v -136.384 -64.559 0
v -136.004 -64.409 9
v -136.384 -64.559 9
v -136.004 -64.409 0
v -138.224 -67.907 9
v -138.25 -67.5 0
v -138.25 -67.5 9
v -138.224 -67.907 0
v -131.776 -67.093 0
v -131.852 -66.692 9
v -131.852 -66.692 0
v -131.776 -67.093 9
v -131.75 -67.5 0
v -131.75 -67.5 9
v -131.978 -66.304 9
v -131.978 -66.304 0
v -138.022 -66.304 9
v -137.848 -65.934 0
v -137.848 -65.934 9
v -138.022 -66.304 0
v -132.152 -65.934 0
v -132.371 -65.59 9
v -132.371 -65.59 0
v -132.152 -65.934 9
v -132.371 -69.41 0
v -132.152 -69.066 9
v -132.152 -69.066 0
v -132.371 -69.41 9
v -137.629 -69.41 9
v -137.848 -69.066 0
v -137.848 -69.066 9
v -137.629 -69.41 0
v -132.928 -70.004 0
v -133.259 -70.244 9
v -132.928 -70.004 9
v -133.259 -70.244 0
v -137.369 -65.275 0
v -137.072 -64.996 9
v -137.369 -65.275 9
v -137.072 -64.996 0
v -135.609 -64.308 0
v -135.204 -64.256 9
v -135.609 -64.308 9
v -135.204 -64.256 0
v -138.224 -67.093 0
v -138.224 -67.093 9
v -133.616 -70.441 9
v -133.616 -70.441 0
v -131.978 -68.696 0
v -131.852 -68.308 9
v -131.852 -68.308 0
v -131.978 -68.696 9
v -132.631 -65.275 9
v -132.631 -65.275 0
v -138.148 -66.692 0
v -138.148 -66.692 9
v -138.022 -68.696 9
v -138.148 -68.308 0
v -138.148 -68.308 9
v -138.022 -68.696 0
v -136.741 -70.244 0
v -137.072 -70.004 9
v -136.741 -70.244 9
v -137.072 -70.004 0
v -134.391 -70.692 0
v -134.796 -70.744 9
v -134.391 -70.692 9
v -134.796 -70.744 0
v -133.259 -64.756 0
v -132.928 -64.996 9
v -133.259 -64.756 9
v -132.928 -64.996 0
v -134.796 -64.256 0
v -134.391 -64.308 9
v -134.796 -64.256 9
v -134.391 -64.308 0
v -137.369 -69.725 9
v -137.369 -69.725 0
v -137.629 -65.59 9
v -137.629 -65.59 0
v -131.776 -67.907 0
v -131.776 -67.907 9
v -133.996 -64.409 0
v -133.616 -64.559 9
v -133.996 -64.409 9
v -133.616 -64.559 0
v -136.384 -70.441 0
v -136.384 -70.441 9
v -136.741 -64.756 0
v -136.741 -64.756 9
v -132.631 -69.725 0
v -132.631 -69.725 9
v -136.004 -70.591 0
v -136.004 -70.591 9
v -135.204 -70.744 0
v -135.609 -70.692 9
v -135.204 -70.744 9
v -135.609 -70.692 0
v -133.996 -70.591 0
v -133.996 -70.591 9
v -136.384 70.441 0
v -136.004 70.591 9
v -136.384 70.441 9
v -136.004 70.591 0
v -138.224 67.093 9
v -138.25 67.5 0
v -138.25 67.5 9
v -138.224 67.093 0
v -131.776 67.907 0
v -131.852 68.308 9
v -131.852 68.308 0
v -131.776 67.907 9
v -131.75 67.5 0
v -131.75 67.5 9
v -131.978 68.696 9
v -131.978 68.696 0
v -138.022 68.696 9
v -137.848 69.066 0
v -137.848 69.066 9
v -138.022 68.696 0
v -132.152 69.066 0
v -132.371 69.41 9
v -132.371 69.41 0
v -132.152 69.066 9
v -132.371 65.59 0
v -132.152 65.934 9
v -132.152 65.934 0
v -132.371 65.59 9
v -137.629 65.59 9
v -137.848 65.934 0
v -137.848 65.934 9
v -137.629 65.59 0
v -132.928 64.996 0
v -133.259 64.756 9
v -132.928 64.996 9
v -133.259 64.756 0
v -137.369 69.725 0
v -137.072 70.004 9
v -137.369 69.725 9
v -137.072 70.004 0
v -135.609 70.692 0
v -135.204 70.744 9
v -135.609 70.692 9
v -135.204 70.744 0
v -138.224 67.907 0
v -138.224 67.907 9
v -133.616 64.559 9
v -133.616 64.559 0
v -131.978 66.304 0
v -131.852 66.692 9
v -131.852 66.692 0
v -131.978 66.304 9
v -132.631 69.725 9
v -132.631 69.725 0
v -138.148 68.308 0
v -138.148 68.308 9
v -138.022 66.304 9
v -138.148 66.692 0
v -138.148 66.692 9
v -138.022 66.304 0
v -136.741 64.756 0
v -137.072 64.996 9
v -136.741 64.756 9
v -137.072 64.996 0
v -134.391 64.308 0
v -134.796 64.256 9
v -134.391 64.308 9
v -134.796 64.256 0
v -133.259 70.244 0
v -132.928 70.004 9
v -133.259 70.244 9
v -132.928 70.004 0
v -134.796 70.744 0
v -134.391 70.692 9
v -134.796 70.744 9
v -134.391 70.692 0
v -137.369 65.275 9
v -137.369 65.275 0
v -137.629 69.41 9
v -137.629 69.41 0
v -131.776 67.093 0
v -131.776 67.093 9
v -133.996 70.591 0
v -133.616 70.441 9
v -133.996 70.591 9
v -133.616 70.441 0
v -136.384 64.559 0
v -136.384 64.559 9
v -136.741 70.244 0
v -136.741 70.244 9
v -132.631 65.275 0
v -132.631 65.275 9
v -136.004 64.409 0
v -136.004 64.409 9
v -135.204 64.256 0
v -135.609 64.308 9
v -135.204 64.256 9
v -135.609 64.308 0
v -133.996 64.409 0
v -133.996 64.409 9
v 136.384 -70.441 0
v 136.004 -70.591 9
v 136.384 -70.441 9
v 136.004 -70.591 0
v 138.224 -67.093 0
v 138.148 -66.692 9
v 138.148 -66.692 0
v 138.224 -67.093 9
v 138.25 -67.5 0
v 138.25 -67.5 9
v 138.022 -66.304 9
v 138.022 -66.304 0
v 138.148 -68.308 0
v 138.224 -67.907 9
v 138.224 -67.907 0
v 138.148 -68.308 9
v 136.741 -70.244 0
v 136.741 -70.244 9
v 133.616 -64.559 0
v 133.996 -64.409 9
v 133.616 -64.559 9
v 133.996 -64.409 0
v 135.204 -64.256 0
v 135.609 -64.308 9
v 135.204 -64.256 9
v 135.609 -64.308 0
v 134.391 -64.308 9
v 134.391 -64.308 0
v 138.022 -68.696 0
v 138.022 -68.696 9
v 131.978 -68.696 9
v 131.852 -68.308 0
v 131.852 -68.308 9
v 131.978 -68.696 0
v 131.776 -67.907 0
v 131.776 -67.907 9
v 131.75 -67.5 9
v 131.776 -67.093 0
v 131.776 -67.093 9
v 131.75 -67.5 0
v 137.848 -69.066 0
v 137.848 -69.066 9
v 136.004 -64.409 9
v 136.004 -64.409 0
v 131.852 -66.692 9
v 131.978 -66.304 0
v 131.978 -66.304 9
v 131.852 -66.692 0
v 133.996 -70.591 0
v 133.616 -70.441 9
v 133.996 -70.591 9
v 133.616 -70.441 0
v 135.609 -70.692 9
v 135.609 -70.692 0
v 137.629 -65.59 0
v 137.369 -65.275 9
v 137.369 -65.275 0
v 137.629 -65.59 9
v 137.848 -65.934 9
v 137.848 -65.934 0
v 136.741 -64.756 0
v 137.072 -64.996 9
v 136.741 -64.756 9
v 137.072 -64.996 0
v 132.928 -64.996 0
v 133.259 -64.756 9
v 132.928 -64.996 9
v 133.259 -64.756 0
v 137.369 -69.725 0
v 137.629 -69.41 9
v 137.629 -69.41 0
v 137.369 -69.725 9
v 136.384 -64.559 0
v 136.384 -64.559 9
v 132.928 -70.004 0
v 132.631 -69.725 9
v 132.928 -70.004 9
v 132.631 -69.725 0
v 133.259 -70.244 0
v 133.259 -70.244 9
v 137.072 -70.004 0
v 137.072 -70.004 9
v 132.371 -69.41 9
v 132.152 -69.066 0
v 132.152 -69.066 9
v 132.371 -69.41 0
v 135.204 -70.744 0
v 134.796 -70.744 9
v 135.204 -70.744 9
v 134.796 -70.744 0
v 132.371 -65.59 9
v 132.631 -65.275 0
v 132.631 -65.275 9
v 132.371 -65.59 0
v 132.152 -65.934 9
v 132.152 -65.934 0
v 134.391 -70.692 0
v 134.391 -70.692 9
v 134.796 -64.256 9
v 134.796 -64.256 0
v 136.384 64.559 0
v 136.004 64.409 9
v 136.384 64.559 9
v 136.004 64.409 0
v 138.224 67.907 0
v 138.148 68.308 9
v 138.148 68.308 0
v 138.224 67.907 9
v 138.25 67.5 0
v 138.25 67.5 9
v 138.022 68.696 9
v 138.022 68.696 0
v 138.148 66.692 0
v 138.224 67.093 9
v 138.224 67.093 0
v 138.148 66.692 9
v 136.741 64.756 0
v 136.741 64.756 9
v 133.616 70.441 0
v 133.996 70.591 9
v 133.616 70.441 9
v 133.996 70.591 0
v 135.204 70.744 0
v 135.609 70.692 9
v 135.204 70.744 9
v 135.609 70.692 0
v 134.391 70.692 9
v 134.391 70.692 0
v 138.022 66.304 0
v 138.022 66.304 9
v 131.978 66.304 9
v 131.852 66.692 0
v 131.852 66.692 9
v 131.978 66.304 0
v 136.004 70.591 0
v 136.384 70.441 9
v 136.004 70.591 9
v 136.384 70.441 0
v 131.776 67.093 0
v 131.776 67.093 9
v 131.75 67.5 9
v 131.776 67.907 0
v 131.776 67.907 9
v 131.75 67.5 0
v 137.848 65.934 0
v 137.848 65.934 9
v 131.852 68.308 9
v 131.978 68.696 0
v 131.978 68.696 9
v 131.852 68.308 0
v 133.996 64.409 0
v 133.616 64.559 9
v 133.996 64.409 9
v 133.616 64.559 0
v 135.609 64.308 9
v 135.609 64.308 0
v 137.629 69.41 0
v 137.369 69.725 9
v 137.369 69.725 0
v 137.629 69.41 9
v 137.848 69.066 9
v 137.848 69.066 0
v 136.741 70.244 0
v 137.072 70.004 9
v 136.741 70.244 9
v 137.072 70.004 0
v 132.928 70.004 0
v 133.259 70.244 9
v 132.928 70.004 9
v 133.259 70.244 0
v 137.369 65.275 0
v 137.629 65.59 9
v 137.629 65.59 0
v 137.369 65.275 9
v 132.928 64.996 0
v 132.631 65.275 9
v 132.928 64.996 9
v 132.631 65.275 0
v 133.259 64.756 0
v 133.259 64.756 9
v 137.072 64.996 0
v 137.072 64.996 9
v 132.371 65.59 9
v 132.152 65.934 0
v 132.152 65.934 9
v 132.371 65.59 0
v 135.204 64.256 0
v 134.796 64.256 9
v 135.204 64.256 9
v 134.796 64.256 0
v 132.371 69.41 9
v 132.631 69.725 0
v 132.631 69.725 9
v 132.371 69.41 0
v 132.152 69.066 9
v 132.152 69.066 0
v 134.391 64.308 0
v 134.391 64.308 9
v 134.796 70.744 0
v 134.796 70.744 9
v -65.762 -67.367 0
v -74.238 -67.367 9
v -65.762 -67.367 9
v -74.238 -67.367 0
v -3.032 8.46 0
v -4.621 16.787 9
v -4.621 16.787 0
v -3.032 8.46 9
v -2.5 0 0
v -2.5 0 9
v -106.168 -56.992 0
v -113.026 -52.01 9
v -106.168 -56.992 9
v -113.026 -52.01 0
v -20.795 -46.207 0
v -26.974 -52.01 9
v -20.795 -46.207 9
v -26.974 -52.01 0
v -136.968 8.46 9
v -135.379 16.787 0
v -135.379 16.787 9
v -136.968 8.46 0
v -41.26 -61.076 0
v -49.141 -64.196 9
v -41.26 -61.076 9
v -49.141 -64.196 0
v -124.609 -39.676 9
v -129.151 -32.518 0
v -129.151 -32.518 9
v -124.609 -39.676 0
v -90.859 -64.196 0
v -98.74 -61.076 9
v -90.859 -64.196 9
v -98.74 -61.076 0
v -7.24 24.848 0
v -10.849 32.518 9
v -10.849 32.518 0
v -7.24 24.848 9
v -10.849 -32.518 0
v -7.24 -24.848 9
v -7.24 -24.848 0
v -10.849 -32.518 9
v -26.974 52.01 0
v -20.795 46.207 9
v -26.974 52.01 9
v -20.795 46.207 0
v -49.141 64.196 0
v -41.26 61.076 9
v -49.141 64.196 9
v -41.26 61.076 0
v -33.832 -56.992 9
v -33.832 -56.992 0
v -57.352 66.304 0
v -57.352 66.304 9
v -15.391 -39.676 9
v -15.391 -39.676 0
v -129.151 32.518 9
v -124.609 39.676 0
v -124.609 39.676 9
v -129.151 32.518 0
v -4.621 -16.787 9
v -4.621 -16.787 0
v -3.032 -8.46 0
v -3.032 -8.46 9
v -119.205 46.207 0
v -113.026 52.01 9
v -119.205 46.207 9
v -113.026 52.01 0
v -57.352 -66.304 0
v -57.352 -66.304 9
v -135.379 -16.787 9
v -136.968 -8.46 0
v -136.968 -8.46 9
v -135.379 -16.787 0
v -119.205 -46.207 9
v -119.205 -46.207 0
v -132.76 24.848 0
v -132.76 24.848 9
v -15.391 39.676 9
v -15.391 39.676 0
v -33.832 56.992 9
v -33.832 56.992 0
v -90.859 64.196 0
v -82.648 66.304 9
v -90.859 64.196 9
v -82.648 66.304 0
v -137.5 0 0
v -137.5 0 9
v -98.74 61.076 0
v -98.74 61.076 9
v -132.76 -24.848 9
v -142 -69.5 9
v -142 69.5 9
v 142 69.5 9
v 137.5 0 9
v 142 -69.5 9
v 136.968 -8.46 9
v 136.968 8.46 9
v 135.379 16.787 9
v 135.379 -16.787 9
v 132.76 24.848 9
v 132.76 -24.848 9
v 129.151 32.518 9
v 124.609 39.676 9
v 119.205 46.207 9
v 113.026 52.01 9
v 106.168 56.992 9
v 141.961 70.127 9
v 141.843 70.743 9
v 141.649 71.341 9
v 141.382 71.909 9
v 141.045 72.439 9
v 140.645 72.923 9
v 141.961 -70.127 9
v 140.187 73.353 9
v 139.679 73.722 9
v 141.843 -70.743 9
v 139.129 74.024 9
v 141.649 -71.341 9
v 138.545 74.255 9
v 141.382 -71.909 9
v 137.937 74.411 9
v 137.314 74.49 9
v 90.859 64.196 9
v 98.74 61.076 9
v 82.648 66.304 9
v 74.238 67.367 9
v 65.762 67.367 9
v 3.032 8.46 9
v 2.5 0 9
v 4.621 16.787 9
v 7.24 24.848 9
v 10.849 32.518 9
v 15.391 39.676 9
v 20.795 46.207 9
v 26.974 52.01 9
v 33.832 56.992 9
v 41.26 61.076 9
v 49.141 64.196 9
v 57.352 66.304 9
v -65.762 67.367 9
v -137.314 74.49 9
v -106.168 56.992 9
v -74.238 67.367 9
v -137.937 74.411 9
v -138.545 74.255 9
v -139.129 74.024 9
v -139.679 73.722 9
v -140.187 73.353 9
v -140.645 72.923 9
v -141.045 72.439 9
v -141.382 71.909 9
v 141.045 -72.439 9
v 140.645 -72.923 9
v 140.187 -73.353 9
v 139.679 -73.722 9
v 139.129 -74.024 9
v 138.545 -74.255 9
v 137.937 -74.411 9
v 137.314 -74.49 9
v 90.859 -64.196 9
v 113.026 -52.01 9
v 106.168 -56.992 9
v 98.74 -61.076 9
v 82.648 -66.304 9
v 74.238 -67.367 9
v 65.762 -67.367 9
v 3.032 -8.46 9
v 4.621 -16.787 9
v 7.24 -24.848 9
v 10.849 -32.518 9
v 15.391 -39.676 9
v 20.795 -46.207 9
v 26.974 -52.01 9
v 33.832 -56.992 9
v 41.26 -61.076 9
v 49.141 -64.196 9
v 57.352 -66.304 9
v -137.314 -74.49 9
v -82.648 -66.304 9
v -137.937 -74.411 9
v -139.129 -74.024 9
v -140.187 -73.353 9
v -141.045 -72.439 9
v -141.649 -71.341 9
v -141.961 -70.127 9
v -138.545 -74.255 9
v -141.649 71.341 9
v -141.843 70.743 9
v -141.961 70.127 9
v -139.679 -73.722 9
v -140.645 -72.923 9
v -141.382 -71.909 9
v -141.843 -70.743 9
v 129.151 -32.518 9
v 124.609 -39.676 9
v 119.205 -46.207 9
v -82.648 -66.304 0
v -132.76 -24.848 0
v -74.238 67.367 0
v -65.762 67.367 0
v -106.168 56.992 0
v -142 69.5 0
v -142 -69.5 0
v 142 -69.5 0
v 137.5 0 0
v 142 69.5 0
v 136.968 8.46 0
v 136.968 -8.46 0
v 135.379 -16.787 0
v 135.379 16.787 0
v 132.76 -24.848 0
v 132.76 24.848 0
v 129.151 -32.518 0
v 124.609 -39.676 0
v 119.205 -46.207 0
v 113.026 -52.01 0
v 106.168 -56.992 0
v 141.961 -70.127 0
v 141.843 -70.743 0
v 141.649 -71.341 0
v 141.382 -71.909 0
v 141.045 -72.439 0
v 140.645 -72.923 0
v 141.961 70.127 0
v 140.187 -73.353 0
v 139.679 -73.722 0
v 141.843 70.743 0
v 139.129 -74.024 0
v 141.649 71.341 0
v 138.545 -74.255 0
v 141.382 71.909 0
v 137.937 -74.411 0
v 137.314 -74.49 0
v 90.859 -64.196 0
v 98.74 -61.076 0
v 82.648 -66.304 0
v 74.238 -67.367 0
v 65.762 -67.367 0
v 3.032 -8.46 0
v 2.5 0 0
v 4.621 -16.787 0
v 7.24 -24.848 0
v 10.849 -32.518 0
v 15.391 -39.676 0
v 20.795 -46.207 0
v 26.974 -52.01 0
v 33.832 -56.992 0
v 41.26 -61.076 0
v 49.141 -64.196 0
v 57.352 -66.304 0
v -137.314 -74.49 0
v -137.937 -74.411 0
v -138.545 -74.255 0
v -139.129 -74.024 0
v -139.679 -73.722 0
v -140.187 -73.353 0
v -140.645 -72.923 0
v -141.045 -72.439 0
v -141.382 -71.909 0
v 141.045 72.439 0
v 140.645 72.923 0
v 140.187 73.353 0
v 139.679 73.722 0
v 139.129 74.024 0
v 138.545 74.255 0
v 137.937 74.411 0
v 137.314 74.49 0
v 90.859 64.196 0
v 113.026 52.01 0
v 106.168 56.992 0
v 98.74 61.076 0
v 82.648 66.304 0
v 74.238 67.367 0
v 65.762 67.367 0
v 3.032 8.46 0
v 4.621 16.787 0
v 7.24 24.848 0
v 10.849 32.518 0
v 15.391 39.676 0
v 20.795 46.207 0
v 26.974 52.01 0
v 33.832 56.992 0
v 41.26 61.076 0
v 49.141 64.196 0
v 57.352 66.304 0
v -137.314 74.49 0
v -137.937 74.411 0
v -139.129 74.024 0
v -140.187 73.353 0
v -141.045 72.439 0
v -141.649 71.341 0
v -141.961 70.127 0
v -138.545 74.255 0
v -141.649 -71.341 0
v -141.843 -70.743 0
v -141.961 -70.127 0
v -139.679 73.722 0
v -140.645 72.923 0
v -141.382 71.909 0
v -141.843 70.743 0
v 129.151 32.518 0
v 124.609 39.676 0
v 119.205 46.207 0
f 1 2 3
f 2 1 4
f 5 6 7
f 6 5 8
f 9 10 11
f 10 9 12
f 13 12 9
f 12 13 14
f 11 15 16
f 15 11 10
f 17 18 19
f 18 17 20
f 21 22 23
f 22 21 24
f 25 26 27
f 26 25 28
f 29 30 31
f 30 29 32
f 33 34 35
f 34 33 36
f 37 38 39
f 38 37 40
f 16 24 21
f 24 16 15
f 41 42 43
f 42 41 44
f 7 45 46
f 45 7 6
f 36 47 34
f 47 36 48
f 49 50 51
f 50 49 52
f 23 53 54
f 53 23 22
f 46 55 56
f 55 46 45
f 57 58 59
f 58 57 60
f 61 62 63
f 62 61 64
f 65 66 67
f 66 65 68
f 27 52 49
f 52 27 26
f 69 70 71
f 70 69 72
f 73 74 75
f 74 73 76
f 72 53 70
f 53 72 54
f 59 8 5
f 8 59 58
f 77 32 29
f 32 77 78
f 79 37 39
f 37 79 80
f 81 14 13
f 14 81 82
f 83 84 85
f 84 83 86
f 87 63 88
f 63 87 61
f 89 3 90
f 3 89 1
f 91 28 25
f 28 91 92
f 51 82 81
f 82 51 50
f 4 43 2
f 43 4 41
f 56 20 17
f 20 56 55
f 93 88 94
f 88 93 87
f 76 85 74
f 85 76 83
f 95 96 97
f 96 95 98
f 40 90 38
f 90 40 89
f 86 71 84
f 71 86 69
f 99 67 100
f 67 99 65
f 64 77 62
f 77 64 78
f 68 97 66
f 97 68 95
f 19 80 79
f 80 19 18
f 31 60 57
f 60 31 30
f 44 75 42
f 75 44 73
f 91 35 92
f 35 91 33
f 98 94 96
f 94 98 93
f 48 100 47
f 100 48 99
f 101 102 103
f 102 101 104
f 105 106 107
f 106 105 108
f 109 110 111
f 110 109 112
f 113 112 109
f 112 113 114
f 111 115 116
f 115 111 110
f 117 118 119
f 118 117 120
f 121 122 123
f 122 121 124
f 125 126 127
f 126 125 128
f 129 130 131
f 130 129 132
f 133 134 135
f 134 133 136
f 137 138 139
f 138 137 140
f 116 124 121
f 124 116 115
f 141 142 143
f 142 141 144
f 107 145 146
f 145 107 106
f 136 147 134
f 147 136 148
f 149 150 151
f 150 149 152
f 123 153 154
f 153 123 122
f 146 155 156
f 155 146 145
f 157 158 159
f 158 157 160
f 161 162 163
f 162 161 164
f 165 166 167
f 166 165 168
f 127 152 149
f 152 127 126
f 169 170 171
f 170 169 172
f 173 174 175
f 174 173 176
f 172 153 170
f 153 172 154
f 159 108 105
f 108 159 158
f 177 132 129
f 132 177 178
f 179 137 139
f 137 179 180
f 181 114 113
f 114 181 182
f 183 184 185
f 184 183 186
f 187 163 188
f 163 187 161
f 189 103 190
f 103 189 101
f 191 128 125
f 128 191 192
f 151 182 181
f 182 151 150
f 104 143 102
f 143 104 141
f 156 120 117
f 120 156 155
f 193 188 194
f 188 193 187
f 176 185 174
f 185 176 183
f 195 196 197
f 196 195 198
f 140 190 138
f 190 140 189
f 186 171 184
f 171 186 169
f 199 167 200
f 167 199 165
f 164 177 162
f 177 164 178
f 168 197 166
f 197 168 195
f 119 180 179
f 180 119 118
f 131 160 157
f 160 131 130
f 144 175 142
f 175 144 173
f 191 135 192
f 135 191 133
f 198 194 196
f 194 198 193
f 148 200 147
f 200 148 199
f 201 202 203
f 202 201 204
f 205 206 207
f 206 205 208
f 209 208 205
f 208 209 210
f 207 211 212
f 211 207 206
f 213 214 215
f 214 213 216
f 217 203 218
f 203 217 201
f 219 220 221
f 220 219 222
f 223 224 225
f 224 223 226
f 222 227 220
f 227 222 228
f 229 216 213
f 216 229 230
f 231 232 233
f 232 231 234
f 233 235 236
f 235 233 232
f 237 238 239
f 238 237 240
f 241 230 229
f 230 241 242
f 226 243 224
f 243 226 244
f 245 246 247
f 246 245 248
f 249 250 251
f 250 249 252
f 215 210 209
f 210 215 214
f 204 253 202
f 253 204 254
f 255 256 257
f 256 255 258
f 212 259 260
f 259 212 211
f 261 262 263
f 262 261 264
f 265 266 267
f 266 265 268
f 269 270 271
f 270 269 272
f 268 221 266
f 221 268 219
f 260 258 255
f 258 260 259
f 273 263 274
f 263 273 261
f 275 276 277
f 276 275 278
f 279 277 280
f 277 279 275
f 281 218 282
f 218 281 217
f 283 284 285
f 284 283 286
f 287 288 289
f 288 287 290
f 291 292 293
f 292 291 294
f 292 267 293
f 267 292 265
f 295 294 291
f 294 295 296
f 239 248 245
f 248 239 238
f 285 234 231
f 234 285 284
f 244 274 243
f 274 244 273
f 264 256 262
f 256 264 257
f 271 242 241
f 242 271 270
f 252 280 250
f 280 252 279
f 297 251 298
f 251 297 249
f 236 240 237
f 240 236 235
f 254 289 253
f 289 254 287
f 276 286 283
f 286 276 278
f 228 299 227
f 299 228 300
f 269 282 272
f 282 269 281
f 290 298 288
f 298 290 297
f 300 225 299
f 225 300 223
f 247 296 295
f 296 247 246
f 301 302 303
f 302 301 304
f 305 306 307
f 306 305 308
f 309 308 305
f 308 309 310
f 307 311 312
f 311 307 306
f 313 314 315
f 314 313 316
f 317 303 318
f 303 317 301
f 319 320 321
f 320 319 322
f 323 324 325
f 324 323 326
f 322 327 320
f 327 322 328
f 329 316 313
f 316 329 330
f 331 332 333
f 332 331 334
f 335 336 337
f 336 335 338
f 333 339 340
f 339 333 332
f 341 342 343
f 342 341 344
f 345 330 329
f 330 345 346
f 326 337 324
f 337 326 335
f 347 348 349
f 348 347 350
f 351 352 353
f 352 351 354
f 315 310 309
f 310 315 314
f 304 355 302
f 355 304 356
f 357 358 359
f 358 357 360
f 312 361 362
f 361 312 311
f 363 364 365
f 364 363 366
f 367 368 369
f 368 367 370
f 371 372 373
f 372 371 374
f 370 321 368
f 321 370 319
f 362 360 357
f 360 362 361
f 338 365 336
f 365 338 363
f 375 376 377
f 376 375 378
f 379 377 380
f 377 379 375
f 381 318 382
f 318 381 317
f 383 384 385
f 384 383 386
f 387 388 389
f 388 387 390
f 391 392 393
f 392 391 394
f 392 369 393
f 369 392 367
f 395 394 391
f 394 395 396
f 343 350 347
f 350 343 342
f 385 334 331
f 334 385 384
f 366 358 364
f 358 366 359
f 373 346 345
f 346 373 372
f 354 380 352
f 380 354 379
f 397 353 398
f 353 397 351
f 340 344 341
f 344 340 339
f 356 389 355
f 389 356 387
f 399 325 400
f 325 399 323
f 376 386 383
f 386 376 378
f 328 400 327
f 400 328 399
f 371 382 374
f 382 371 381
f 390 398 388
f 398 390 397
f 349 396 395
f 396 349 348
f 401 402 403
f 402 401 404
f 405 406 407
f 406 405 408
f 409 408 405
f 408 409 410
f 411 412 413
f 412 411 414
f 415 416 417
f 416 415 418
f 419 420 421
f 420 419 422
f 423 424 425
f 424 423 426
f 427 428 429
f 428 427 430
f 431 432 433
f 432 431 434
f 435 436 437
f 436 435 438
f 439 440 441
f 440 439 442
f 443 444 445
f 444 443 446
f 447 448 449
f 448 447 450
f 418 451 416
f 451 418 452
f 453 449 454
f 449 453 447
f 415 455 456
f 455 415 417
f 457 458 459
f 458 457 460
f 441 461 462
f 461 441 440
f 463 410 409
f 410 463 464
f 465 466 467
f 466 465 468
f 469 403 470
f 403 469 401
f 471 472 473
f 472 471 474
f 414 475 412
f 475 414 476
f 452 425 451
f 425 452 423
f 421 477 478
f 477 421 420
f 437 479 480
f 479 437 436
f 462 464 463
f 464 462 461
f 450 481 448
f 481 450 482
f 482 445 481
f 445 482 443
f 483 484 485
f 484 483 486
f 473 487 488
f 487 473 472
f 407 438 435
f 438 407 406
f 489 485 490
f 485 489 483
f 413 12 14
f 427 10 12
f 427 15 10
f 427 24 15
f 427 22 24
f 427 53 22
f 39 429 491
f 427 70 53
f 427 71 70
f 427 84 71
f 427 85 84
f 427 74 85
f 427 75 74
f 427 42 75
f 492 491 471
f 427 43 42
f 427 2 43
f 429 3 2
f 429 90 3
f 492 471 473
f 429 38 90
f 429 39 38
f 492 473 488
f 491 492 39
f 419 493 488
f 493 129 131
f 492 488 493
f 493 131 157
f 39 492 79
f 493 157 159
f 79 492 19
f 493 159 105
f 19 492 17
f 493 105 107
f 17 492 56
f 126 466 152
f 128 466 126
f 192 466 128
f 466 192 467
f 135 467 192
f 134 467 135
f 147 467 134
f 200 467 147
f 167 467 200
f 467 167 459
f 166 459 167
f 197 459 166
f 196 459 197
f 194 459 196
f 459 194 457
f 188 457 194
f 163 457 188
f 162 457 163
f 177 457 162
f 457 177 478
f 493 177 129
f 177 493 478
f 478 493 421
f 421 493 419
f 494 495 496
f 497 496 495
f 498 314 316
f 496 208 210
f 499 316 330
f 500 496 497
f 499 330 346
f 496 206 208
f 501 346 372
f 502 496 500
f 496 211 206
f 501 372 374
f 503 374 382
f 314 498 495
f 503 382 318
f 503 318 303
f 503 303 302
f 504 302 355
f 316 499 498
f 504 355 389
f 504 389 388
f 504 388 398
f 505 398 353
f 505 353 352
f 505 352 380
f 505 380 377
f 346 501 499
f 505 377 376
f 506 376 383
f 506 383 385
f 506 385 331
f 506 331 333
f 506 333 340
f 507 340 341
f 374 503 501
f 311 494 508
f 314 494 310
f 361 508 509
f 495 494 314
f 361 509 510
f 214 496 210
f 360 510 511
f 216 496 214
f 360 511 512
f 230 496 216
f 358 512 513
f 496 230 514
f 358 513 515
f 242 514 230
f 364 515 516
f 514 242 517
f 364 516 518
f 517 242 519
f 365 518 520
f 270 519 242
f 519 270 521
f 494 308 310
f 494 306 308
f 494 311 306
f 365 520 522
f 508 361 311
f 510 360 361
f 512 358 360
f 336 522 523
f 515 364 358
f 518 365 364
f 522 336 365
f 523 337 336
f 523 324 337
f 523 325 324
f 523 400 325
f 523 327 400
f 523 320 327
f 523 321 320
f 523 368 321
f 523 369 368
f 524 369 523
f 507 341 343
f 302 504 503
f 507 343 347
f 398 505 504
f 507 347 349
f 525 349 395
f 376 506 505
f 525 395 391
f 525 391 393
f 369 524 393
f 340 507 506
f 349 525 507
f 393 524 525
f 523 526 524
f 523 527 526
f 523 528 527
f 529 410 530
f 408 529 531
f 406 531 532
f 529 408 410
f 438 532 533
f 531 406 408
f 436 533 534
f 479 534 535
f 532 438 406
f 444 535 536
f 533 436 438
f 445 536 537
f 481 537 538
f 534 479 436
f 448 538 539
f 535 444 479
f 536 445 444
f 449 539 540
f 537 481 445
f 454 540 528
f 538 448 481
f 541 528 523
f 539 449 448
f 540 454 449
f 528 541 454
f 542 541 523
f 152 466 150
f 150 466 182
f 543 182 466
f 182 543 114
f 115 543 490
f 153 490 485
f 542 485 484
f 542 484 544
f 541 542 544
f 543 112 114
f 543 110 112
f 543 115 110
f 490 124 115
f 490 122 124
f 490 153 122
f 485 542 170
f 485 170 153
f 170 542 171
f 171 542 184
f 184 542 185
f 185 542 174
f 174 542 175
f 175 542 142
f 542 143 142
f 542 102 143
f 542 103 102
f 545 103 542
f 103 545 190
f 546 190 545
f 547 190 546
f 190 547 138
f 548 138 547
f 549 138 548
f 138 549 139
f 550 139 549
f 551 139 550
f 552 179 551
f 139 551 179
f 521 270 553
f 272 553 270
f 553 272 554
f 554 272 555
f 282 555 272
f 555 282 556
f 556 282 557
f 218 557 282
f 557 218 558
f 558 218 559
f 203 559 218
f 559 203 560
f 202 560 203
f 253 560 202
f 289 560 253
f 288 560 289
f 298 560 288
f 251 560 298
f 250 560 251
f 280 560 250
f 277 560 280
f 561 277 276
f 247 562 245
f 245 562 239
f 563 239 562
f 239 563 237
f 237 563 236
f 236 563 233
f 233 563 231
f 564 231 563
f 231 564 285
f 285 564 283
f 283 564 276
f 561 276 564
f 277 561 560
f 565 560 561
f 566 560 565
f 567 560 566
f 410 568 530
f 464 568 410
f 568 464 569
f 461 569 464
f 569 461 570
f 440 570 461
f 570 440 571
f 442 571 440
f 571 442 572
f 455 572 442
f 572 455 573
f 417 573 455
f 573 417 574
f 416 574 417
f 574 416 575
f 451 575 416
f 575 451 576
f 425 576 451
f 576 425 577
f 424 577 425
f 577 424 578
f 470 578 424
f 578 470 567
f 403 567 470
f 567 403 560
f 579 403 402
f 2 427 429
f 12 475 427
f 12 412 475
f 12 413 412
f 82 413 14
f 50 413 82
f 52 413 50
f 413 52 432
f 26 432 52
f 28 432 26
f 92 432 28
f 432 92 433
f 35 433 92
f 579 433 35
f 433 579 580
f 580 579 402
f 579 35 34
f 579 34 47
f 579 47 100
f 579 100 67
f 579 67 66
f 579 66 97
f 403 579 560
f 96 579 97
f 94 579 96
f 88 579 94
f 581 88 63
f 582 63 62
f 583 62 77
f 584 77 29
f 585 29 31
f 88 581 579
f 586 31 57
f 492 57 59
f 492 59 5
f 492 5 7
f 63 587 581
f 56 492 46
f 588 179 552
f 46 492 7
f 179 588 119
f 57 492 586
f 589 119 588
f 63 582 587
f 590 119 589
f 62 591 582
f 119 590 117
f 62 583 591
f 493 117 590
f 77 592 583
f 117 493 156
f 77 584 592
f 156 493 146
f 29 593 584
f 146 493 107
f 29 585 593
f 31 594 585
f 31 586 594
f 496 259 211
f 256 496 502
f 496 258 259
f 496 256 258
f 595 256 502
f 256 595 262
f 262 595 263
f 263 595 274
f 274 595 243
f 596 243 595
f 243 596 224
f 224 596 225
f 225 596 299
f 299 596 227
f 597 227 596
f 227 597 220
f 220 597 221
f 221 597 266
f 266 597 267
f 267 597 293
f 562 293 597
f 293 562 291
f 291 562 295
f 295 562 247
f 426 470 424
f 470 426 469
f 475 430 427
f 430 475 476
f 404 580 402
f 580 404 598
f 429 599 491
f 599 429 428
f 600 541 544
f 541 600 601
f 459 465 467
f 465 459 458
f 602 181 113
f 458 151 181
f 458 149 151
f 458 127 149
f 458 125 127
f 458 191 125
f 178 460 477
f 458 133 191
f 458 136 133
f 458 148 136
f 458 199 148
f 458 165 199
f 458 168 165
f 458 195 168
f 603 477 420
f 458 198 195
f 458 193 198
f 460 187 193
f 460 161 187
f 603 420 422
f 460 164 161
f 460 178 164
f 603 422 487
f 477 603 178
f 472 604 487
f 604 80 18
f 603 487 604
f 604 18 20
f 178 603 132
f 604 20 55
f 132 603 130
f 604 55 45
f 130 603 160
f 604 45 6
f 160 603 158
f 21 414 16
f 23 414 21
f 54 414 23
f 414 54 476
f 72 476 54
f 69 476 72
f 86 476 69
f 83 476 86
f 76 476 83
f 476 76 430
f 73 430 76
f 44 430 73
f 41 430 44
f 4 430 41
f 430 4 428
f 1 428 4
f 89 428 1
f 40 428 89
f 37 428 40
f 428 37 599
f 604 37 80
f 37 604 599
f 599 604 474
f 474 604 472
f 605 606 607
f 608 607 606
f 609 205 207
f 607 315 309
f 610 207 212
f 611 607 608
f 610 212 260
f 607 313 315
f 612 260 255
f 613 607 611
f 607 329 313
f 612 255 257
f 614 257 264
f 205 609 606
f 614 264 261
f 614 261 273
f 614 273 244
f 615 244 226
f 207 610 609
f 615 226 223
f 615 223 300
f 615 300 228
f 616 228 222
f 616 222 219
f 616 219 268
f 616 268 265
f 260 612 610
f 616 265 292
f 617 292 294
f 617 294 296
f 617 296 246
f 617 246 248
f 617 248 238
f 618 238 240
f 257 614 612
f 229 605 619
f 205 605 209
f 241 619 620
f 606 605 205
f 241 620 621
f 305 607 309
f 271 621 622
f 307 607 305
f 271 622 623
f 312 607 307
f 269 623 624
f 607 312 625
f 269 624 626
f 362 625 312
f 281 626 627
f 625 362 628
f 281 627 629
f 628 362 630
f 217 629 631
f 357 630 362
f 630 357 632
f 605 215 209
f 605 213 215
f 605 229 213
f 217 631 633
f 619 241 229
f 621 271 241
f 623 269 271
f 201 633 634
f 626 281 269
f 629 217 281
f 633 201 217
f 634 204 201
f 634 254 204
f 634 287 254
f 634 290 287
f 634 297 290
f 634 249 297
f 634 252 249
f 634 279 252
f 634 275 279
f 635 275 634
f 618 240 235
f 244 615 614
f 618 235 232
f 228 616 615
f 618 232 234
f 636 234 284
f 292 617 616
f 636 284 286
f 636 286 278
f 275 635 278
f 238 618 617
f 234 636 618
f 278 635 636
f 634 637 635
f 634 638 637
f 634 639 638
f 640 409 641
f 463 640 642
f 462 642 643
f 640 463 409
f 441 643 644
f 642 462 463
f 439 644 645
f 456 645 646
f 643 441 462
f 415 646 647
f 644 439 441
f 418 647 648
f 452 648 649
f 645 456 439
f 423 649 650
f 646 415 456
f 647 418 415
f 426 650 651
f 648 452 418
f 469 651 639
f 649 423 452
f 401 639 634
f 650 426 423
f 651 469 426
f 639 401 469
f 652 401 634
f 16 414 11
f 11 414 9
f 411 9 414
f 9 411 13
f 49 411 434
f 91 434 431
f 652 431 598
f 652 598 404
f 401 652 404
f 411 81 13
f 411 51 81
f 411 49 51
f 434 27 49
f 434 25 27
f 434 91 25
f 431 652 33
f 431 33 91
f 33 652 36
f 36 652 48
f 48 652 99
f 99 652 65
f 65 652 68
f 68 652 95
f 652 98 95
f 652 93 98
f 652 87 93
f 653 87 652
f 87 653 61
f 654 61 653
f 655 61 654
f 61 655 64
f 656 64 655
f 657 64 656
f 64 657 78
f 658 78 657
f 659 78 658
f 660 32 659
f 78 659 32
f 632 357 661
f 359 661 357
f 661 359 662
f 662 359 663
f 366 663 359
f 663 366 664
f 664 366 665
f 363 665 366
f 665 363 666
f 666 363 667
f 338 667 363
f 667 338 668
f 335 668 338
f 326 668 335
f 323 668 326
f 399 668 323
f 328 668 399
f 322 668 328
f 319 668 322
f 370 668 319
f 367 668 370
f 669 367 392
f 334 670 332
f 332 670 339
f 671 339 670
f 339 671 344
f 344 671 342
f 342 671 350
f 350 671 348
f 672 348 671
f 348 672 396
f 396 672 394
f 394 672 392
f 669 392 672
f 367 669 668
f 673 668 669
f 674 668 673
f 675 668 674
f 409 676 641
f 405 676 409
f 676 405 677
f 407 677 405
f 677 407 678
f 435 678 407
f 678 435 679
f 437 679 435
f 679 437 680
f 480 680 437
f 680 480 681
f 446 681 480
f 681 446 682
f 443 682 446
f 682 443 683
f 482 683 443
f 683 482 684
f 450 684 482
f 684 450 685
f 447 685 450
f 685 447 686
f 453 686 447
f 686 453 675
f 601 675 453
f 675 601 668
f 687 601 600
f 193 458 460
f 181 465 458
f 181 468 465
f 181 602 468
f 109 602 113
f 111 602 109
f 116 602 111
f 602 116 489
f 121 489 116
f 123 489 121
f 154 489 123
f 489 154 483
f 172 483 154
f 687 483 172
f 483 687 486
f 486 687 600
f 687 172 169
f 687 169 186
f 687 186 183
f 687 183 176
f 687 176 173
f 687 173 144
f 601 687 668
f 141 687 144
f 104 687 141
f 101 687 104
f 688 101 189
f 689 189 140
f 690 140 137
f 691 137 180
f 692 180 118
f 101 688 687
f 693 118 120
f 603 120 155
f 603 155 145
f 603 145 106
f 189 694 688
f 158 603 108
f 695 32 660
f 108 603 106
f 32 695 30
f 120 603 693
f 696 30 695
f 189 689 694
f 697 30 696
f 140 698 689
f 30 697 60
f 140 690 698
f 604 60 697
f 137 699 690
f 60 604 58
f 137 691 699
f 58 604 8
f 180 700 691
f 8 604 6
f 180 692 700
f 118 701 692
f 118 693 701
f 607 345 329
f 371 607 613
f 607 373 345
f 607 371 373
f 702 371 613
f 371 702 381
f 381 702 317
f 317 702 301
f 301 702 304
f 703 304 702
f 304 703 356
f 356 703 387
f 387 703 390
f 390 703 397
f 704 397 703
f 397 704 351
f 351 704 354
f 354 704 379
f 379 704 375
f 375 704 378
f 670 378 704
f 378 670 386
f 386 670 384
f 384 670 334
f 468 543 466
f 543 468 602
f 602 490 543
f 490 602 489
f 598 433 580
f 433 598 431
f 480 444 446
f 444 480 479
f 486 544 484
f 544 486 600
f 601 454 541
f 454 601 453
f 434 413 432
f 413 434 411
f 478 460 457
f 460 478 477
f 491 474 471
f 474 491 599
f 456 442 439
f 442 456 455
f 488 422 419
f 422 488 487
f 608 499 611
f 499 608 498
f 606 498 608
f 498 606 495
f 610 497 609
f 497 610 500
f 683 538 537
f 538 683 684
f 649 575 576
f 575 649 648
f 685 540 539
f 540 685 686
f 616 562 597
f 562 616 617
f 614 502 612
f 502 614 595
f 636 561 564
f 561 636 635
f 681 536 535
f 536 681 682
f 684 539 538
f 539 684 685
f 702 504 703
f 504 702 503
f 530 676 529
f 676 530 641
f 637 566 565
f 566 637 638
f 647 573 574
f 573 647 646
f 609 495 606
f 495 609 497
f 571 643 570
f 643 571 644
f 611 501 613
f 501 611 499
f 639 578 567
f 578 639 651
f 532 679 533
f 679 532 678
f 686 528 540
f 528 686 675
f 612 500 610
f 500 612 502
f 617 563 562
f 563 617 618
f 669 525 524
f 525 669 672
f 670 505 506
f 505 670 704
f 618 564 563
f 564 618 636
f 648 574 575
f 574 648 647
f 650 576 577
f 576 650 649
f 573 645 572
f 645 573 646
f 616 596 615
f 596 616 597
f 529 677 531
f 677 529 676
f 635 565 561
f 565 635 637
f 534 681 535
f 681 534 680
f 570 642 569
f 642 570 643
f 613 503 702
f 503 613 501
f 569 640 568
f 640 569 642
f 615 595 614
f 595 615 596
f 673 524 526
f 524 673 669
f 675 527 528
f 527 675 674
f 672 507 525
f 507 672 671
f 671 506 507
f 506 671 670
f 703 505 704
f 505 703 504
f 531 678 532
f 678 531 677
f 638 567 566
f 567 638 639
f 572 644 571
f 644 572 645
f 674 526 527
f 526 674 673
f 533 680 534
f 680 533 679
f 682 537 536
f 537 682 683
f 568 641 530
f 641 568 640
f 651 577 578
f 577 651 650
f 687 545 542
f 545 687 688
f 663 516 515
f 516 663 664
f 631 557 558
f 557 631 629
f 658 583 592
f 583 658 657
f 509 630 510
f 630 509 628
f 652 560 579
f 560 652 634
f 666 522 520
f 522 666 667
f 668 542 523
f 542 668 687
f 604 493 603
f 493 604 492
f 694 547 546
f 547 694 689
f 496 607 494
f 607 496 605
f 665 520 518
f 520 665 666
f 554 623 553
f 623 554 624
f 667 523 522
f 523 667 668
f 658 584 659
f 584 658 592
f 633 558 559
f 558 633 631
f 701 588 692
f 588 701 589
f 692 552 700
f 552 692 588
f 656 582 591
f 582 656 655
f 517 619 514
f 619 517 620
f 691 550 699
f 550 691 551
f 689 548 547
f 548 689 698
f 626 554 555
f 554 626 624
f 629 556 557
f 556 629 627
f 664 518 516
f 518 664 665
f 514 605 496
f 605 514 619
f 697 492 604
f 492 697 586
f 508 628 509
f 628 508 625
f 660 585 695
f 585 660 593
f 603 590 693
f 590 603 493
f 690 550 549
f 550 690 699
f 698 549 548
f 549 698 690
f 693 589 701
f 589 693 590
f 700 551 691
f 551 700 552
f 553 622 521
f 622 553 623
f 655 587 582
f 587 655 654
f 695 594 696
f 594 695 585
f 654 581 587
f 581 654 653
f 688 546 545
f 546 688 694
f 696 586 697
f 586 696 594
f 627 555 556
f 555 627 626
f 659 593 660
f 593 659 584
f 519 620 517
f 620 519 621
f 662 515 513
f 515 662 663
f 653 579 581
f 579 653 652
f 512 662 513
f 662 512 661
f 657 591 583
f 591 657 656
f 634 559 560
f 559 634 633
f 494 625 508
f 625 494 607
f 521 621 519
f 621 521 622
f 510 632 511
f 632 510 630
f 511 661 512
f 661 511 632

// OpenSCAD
$fn = 50;


difference() {
	union() {
		hull() {
			translate(v = [-137.0000000000, 69.5000000000, 0]) {
				cylinder(h = 9, r = 5);
			}
			translate(v = [137.0000000000, 69.5000000000, 0]) {
				cylinder(h = 9, r = 5);
			}
			translate(v = [-137.0000000000, -69.5000000000, 0]) {
				cylinder(h = 9, r = 5);
			}
			translate(v = [137.0000000000, -69.5000000000, 0]) {
				cylinder(h = 9, r = 5);
			}
		}
	}
	union() {
		#translate(v = [-135.0000000000, -67.5000000000, -100.0000000000]) {
			cylinder(h = 200, r = 3.2500000000);
		}
		#translate(v = [-135.0000000000, 67.5000000000, -100.0000000000]) {
			cylinder(h = 200, r = 3.2500000000);
		}
		#translate(v = [135.0000000000, -67.5000000000, -100.0000000000]) {
			cylinder(h = 200, r = 3.2500000000);
		}
		#translate(v = [135.0000000000, 67.5000000000, -100.0000000000]) {
			cylinder(h = 200, r = 3.2500000000);
		}
		#translate(v = [-70.0000000000, 0, 0]) {
			cylinder(h = 9, r = 67.5000000000);
		}
		#translate(v = [70.0000000000, 0, 0]) {
			cylinder(h = 9, r = 67.5000000000);
		}
	}
}
